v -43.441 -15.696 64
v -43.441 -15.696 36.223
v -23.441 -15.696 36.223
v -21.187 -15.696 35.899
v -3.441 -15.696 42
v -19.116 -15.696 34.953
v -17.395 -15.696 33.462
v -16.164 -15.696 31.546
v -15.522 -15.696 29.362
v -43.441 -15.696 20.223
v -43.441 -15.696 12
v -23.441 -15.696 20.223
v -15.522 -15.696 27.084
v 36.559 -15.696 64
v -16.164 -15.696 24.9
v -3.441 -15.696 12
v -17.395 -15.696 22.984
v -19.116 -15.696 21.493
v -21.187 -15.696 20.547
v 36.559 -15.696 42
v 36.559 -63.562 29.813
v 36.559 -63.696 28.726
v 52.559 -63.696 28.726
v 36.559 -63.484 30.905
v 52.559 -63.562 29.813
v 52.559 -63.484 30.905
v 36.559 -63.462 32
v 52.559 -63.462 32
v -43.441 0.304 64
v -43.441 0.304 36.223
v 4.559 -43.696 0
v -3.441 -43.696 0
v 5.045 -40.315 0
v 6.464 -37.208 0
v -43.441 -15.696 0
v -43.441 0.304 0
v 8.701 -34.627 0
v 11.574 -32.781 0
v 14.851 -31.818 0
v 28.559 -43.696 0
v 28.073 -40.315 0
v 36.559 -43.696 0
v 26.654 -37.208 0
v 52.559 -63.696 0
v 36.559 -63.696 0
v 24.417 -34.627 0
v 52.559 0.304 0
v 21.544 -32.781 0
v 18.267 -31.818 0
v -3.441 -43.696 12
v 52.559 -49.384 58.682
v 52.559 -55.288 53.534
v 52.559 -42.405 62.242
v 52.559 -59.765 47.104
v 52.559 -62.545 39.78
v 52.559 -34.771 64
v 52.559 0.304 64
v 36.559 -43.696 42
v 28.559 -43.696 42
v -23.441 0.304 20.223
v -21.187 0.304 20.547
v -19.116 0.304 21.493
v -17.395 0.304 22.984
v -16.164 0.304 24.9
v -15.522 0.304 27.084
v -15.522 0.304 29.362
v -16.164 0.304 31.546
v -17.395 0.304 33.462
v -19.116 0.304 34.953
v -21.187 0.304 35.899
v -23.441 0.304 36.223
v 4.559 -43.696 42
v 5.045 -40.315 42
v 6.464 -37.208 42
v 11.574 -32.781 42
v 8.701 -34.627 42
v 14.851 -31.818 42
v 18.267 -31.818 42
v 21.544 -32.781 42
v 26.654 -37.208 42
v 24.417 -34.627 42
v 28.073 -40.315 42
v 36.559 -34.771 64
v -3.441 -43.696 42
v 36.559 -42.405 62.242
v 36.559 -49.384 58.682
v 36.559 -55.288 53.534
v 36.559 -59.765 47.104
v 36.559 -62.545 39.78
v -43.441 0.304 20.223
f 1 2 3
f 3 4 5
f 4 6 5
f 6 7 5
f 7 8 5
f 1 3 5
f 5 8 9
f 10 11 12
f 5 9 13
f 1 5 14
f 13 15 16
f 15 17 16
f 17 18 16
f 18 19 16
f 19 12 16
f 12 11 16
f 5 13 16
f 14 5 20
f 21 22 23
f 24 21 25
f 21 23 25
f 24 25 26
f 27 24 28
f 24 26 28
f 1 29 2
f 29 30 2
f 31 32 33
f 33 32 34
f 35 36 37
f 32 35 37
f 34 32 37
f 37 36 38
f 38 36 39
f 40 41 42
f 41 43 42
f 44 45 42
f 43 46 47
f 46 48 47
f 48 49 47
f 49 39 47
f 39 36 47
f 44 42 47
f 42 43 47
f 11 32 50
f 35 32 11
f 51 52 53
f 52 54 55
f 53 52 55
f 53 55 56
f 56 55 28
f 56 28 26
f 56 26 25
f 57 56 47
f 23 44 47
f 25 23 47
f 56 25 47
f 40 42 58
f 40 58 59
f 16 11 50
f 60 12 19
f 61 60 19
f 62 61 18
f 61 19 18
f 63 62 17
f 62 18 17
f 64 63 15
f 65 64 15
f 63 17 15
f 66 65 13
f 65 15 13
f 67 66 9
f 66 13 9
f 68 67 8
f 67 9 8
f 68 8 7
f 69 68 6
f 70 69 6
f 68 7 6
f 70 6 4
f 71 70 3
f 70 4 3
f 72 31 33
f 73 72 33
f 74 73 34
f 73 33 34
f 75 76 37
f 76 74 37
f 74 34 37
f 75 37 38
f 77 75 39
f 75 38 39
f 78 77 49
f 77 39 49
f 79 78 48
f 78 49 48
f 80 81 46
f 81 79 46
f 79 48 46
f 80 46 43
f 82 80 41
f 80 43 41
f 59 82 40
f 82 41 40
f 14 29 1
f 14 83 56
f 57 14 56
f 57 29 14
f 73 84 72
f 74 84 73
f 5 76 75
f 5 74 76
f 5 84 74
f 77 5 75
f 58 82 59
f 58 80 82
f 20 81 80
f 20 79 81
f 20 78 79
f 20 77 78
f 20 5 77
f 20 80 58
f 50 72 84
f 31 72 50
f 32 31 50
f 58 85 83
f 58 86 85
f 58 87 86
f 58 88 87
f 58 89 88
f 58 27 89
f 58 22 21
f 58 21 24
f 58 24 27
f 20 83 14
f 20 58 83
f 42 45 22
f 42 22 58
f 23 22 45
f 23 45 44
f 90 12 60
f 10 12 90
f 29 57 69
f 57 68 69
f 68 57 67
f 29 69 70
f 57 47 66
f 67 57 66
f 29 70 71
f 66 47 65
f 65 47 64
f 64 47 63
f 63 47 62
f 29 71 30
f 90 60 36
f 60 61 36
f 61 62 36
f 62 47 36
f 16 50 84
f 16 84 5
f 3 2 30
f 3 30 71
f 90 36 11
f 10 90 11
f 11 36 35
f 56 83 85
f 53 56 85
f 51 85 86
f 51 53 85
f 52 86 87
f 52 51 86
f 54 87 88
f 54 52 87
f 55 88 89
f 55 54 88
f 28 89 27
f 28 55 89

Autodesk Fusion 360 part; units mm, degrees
sketch "Sketch1" plane through (0, 0, 0) normal (0, 0, 1) x (1, 0, 0) in component "Box"
  line L0 (-43.441, -63.6961) -> (52.559, -63.6961)
  line L1 (52.559, -63.6961) -> (52.559, 0.3039)
  line L2 (52.559, 0.3039) -> (-43.441, 0.3039)
  line L3 (-43.441, 0.3039) -> (-43.441, -63.6961)
  line L4 (-43.441, -15.6961) -> (52.559, -15.6961)
  line L5 (-163.441, -63.6961) -> (36.559, -63.6961)
  line L6 (36.559, -63.6961) -> (36.559, -43.6961)
  line L7 (36.559, -43.6961) -> (-163.441, -43.6961)
  line L8 (-163.441, -43.6961) -> (-163.441, -63.6961)
  circle A0 centre (16.559, -43.6961) radius 12
  line L9 (36.559, -43.6961) -> (36.559, -15.6961)
  line L10 (-3.441, -63.6961) -> (-3.441, -15.6961)
  line L11 (-3.441, -43.6961) -> (-43.441, -15.6961)
  dimension "d1" = 96
  dimension "d2" = 64
  dimension "d3" = 16
  dimension "d4" = 200
  dimension "d5" = 20
  dimension "d6" = 16
  dimension "d7" = 24
  dimension "d8" = 20
  dimension "d9" = 20
  dimension "d10" = 40
  dimension "d11" = 28
  dimension "d12" = 40
extrude "Extrude1" add sketch "Sketch1" along normal blind 12 contours L4 L10 L11 in component "Box"
extrude "Extrude2" add sketch "Sketch1" along normal blind 42 contours L4 L7 A0 L9 L10 in component "Box"
sketch "Sketch2" plane through (0, 0, 0) normal (0, 0, 1) x (1, 0, 0) in component "Box"
  line L0 (36.559, -16.6004) -> (36.559, 0)
  line L1 (52.559, -63.6961) -> (52.559, 0.3039)
  dimension "d17" = 16
extrude "Extrude3" add sketch "Sketch1" along normal blind 64 contours L0 L1 L4 L6 L9 in component "Box"
sketch "Sketch3" plane through (0, -63.6961, 0) normal (0, -1, 0) x (1, 0, 0) in component "Box"
  line L0 (36.559, 0) -> (52.559, 0)
  line L1 (52.559, 0) -> (52.559, 64)
  line L2 (52.559, 64) -> (36.559, 64)
  line L3 (36.559, 64) -> (36.559, 0)
sketch "Sketch4" plane through (0, -43.6961, 0) normal (0, -1, 0) x (1, 0, 0) in component "Box"
  line L0 (28.559, 0) -> (36.559, 0)
  line L1 (36.559, 0) -> (36.559, 42)
  line L2 (36.559, 42) -> (28.559, 42)
  line L3 (28.559, 42) -> (28.559, 0)
  line L4 (52.3937, 32) -> (52.3937, 0) construction
  dimension "d20" = 32
sketch "Sketch5" plane through (52.559, 0, 0) normal (1, 0, 0) x (0, 1, 0) in component "Box"
  line L0 (-63.6961, 0) -> (-15.6961, 0)
  line L1 (-15.6961, 0) -> (-15.6961, 64)
  line L2 (-15.6961, 64) -> (-63.6961, 64) construction
  line L3 (-63.6961, 64) -> (-63.6961, 0)
  arc A0 (-31.6961, 64) -> (-63.6953, 32) centre (-31.6953, 32) ccw
  line L4 (-31.6953, 32) -> (69.344, 47.5915) construction
  line L5 (-63.6961, 34.0454) -> (-63.6961, 29.5) construction
  point P0 (18.8244, 39.7958)
  dimension "d24" = 32
  dimension "d25" = 32
  dimension "d28" = 16
sketch "Sketch6" plane through (52.559, 0, 0) normal (1, 0, 0) x (0, 1, 0) in component "Box"
  line L0 (-63.6961, 0) -> (-15.6961, 0)
  line L1 (-15.6961, 0) -> (-15.6961, 64)
  line L2 (-15.6961, 64) -> (-63.6961, 64)
  line L3 (-63.6961, 64) -> (-63.6961, 0)
sketch "Sketch7" plane through (52.559, -39.6961, 32) normal (1, 0, 0) x (0, 1, 0) in component "Box"
  arc A0 (7.6874, 74.9842) -> (-66.58, -0.2294) centre (8.2336, 0.1714) ccw
  arc A1 (8, 32.1706) -> (7.6874, 74.9842) centre (7.8437, 53.5774) ccw
  arc A2 (8, 32.1706) -> (-23.7659, 0) centre (8.2336, 0.1714) ccw
  arc A3 (-66.58, -0.2294) -> (-23.7659, 0) centre (-45.173, -0.1147) ccw
  arc A4 (7.8437, 53.5774) -> (-45.173, -0.1147) centre (8.2336, 0.1714) ccw construction
  line L0 (24, -32) -> (24, 32)
  line L1 (-24, -32) -> (40, -32)
  dimension "d29" = 32
  dimension "d30" = 16
  dimension "d31" = 32
extrude "Extrude4" cut sketch "Sketch7" against normal blind 30 in component "Box"
sketch "Sketch8" plane through (0, 0, 0) normal (1, 0, 0) x (0, 1, 0) in component "Box"
  line L0 (-63.6961, 0) -> (0.3039, 0)
  point P0 (-63.6953, 32)
  dimension "d34" = 32
extrude "Extrude5" add sketch "Sketch1" along normal blind 64 contours L1 L2 L3 L4 in component "Box"
sketch "Sketch9" plane through (0, 0, 0) normal (0, 0, 1) x (1, 0, 0) in component "Box"
  line L0 (52.559, 0.3039) -> (-43.441, 0.3039)
  point P0 (52.559, -31.6961)
  dimension "d37" = 32
sketch "Sketch10" plane through (0, -15.6961, 0) normal (0, -1, 0) x (1, 0, 0) in component "Box"
  line L0 (36.559, 42) -> (36.559, 64)
  line L1 (36.559, 64) -> (-43.441, 64)
  line L2 (-43.441, 64) -> (-43.441, 12)
  line L3 (-43.441, 12) -> (-3.441, 12)
  line L4 (-3.441, 12) -> (-3.441, 42)
  line L5 (-3.441, 42) -> (36.559, 42)
  line L6 (-43.441, 64) -> (-43.441, 28.223) construction
  line L7 (-43.441, 28.223) -> (-8.4006, 28.223) construction
  circle A0 centre (-23.441, 28.223) radius 8
  line L8 (-23.441, 28.223) -> (-23.441, 48.1368) construction
  line L9 (-23.441, 48.1368) -> (-23.441, 12.9343) construction
  line L10 (-23.441, 20.223) -> (-43.441, 20.223)
  line L11 (-43.441, 20.223) -> (-43.441, 36.223)
  line L12 (-43.441, 36.223) -> (-23.441, 36.223)
  line L13 (-23.441, 36.223) -> (-23.441, 20.223)
  dimension "d38" = 35.777
  dimension "d39" = 16
  dimension "d40" = 20
  dimension "d41" = 20
  dimension "d42" = 16
extrude "Extrude6" cut sketch "Sketch10" against normal blind 155 contours L2 A0 L10 L11 L12 | A0 L13 | A0 L13 in component "Box"
component "Box" placed x (1, 0, 0) y (0, 1, 0) z (0, 0, 1) at (0, 0, 0)
